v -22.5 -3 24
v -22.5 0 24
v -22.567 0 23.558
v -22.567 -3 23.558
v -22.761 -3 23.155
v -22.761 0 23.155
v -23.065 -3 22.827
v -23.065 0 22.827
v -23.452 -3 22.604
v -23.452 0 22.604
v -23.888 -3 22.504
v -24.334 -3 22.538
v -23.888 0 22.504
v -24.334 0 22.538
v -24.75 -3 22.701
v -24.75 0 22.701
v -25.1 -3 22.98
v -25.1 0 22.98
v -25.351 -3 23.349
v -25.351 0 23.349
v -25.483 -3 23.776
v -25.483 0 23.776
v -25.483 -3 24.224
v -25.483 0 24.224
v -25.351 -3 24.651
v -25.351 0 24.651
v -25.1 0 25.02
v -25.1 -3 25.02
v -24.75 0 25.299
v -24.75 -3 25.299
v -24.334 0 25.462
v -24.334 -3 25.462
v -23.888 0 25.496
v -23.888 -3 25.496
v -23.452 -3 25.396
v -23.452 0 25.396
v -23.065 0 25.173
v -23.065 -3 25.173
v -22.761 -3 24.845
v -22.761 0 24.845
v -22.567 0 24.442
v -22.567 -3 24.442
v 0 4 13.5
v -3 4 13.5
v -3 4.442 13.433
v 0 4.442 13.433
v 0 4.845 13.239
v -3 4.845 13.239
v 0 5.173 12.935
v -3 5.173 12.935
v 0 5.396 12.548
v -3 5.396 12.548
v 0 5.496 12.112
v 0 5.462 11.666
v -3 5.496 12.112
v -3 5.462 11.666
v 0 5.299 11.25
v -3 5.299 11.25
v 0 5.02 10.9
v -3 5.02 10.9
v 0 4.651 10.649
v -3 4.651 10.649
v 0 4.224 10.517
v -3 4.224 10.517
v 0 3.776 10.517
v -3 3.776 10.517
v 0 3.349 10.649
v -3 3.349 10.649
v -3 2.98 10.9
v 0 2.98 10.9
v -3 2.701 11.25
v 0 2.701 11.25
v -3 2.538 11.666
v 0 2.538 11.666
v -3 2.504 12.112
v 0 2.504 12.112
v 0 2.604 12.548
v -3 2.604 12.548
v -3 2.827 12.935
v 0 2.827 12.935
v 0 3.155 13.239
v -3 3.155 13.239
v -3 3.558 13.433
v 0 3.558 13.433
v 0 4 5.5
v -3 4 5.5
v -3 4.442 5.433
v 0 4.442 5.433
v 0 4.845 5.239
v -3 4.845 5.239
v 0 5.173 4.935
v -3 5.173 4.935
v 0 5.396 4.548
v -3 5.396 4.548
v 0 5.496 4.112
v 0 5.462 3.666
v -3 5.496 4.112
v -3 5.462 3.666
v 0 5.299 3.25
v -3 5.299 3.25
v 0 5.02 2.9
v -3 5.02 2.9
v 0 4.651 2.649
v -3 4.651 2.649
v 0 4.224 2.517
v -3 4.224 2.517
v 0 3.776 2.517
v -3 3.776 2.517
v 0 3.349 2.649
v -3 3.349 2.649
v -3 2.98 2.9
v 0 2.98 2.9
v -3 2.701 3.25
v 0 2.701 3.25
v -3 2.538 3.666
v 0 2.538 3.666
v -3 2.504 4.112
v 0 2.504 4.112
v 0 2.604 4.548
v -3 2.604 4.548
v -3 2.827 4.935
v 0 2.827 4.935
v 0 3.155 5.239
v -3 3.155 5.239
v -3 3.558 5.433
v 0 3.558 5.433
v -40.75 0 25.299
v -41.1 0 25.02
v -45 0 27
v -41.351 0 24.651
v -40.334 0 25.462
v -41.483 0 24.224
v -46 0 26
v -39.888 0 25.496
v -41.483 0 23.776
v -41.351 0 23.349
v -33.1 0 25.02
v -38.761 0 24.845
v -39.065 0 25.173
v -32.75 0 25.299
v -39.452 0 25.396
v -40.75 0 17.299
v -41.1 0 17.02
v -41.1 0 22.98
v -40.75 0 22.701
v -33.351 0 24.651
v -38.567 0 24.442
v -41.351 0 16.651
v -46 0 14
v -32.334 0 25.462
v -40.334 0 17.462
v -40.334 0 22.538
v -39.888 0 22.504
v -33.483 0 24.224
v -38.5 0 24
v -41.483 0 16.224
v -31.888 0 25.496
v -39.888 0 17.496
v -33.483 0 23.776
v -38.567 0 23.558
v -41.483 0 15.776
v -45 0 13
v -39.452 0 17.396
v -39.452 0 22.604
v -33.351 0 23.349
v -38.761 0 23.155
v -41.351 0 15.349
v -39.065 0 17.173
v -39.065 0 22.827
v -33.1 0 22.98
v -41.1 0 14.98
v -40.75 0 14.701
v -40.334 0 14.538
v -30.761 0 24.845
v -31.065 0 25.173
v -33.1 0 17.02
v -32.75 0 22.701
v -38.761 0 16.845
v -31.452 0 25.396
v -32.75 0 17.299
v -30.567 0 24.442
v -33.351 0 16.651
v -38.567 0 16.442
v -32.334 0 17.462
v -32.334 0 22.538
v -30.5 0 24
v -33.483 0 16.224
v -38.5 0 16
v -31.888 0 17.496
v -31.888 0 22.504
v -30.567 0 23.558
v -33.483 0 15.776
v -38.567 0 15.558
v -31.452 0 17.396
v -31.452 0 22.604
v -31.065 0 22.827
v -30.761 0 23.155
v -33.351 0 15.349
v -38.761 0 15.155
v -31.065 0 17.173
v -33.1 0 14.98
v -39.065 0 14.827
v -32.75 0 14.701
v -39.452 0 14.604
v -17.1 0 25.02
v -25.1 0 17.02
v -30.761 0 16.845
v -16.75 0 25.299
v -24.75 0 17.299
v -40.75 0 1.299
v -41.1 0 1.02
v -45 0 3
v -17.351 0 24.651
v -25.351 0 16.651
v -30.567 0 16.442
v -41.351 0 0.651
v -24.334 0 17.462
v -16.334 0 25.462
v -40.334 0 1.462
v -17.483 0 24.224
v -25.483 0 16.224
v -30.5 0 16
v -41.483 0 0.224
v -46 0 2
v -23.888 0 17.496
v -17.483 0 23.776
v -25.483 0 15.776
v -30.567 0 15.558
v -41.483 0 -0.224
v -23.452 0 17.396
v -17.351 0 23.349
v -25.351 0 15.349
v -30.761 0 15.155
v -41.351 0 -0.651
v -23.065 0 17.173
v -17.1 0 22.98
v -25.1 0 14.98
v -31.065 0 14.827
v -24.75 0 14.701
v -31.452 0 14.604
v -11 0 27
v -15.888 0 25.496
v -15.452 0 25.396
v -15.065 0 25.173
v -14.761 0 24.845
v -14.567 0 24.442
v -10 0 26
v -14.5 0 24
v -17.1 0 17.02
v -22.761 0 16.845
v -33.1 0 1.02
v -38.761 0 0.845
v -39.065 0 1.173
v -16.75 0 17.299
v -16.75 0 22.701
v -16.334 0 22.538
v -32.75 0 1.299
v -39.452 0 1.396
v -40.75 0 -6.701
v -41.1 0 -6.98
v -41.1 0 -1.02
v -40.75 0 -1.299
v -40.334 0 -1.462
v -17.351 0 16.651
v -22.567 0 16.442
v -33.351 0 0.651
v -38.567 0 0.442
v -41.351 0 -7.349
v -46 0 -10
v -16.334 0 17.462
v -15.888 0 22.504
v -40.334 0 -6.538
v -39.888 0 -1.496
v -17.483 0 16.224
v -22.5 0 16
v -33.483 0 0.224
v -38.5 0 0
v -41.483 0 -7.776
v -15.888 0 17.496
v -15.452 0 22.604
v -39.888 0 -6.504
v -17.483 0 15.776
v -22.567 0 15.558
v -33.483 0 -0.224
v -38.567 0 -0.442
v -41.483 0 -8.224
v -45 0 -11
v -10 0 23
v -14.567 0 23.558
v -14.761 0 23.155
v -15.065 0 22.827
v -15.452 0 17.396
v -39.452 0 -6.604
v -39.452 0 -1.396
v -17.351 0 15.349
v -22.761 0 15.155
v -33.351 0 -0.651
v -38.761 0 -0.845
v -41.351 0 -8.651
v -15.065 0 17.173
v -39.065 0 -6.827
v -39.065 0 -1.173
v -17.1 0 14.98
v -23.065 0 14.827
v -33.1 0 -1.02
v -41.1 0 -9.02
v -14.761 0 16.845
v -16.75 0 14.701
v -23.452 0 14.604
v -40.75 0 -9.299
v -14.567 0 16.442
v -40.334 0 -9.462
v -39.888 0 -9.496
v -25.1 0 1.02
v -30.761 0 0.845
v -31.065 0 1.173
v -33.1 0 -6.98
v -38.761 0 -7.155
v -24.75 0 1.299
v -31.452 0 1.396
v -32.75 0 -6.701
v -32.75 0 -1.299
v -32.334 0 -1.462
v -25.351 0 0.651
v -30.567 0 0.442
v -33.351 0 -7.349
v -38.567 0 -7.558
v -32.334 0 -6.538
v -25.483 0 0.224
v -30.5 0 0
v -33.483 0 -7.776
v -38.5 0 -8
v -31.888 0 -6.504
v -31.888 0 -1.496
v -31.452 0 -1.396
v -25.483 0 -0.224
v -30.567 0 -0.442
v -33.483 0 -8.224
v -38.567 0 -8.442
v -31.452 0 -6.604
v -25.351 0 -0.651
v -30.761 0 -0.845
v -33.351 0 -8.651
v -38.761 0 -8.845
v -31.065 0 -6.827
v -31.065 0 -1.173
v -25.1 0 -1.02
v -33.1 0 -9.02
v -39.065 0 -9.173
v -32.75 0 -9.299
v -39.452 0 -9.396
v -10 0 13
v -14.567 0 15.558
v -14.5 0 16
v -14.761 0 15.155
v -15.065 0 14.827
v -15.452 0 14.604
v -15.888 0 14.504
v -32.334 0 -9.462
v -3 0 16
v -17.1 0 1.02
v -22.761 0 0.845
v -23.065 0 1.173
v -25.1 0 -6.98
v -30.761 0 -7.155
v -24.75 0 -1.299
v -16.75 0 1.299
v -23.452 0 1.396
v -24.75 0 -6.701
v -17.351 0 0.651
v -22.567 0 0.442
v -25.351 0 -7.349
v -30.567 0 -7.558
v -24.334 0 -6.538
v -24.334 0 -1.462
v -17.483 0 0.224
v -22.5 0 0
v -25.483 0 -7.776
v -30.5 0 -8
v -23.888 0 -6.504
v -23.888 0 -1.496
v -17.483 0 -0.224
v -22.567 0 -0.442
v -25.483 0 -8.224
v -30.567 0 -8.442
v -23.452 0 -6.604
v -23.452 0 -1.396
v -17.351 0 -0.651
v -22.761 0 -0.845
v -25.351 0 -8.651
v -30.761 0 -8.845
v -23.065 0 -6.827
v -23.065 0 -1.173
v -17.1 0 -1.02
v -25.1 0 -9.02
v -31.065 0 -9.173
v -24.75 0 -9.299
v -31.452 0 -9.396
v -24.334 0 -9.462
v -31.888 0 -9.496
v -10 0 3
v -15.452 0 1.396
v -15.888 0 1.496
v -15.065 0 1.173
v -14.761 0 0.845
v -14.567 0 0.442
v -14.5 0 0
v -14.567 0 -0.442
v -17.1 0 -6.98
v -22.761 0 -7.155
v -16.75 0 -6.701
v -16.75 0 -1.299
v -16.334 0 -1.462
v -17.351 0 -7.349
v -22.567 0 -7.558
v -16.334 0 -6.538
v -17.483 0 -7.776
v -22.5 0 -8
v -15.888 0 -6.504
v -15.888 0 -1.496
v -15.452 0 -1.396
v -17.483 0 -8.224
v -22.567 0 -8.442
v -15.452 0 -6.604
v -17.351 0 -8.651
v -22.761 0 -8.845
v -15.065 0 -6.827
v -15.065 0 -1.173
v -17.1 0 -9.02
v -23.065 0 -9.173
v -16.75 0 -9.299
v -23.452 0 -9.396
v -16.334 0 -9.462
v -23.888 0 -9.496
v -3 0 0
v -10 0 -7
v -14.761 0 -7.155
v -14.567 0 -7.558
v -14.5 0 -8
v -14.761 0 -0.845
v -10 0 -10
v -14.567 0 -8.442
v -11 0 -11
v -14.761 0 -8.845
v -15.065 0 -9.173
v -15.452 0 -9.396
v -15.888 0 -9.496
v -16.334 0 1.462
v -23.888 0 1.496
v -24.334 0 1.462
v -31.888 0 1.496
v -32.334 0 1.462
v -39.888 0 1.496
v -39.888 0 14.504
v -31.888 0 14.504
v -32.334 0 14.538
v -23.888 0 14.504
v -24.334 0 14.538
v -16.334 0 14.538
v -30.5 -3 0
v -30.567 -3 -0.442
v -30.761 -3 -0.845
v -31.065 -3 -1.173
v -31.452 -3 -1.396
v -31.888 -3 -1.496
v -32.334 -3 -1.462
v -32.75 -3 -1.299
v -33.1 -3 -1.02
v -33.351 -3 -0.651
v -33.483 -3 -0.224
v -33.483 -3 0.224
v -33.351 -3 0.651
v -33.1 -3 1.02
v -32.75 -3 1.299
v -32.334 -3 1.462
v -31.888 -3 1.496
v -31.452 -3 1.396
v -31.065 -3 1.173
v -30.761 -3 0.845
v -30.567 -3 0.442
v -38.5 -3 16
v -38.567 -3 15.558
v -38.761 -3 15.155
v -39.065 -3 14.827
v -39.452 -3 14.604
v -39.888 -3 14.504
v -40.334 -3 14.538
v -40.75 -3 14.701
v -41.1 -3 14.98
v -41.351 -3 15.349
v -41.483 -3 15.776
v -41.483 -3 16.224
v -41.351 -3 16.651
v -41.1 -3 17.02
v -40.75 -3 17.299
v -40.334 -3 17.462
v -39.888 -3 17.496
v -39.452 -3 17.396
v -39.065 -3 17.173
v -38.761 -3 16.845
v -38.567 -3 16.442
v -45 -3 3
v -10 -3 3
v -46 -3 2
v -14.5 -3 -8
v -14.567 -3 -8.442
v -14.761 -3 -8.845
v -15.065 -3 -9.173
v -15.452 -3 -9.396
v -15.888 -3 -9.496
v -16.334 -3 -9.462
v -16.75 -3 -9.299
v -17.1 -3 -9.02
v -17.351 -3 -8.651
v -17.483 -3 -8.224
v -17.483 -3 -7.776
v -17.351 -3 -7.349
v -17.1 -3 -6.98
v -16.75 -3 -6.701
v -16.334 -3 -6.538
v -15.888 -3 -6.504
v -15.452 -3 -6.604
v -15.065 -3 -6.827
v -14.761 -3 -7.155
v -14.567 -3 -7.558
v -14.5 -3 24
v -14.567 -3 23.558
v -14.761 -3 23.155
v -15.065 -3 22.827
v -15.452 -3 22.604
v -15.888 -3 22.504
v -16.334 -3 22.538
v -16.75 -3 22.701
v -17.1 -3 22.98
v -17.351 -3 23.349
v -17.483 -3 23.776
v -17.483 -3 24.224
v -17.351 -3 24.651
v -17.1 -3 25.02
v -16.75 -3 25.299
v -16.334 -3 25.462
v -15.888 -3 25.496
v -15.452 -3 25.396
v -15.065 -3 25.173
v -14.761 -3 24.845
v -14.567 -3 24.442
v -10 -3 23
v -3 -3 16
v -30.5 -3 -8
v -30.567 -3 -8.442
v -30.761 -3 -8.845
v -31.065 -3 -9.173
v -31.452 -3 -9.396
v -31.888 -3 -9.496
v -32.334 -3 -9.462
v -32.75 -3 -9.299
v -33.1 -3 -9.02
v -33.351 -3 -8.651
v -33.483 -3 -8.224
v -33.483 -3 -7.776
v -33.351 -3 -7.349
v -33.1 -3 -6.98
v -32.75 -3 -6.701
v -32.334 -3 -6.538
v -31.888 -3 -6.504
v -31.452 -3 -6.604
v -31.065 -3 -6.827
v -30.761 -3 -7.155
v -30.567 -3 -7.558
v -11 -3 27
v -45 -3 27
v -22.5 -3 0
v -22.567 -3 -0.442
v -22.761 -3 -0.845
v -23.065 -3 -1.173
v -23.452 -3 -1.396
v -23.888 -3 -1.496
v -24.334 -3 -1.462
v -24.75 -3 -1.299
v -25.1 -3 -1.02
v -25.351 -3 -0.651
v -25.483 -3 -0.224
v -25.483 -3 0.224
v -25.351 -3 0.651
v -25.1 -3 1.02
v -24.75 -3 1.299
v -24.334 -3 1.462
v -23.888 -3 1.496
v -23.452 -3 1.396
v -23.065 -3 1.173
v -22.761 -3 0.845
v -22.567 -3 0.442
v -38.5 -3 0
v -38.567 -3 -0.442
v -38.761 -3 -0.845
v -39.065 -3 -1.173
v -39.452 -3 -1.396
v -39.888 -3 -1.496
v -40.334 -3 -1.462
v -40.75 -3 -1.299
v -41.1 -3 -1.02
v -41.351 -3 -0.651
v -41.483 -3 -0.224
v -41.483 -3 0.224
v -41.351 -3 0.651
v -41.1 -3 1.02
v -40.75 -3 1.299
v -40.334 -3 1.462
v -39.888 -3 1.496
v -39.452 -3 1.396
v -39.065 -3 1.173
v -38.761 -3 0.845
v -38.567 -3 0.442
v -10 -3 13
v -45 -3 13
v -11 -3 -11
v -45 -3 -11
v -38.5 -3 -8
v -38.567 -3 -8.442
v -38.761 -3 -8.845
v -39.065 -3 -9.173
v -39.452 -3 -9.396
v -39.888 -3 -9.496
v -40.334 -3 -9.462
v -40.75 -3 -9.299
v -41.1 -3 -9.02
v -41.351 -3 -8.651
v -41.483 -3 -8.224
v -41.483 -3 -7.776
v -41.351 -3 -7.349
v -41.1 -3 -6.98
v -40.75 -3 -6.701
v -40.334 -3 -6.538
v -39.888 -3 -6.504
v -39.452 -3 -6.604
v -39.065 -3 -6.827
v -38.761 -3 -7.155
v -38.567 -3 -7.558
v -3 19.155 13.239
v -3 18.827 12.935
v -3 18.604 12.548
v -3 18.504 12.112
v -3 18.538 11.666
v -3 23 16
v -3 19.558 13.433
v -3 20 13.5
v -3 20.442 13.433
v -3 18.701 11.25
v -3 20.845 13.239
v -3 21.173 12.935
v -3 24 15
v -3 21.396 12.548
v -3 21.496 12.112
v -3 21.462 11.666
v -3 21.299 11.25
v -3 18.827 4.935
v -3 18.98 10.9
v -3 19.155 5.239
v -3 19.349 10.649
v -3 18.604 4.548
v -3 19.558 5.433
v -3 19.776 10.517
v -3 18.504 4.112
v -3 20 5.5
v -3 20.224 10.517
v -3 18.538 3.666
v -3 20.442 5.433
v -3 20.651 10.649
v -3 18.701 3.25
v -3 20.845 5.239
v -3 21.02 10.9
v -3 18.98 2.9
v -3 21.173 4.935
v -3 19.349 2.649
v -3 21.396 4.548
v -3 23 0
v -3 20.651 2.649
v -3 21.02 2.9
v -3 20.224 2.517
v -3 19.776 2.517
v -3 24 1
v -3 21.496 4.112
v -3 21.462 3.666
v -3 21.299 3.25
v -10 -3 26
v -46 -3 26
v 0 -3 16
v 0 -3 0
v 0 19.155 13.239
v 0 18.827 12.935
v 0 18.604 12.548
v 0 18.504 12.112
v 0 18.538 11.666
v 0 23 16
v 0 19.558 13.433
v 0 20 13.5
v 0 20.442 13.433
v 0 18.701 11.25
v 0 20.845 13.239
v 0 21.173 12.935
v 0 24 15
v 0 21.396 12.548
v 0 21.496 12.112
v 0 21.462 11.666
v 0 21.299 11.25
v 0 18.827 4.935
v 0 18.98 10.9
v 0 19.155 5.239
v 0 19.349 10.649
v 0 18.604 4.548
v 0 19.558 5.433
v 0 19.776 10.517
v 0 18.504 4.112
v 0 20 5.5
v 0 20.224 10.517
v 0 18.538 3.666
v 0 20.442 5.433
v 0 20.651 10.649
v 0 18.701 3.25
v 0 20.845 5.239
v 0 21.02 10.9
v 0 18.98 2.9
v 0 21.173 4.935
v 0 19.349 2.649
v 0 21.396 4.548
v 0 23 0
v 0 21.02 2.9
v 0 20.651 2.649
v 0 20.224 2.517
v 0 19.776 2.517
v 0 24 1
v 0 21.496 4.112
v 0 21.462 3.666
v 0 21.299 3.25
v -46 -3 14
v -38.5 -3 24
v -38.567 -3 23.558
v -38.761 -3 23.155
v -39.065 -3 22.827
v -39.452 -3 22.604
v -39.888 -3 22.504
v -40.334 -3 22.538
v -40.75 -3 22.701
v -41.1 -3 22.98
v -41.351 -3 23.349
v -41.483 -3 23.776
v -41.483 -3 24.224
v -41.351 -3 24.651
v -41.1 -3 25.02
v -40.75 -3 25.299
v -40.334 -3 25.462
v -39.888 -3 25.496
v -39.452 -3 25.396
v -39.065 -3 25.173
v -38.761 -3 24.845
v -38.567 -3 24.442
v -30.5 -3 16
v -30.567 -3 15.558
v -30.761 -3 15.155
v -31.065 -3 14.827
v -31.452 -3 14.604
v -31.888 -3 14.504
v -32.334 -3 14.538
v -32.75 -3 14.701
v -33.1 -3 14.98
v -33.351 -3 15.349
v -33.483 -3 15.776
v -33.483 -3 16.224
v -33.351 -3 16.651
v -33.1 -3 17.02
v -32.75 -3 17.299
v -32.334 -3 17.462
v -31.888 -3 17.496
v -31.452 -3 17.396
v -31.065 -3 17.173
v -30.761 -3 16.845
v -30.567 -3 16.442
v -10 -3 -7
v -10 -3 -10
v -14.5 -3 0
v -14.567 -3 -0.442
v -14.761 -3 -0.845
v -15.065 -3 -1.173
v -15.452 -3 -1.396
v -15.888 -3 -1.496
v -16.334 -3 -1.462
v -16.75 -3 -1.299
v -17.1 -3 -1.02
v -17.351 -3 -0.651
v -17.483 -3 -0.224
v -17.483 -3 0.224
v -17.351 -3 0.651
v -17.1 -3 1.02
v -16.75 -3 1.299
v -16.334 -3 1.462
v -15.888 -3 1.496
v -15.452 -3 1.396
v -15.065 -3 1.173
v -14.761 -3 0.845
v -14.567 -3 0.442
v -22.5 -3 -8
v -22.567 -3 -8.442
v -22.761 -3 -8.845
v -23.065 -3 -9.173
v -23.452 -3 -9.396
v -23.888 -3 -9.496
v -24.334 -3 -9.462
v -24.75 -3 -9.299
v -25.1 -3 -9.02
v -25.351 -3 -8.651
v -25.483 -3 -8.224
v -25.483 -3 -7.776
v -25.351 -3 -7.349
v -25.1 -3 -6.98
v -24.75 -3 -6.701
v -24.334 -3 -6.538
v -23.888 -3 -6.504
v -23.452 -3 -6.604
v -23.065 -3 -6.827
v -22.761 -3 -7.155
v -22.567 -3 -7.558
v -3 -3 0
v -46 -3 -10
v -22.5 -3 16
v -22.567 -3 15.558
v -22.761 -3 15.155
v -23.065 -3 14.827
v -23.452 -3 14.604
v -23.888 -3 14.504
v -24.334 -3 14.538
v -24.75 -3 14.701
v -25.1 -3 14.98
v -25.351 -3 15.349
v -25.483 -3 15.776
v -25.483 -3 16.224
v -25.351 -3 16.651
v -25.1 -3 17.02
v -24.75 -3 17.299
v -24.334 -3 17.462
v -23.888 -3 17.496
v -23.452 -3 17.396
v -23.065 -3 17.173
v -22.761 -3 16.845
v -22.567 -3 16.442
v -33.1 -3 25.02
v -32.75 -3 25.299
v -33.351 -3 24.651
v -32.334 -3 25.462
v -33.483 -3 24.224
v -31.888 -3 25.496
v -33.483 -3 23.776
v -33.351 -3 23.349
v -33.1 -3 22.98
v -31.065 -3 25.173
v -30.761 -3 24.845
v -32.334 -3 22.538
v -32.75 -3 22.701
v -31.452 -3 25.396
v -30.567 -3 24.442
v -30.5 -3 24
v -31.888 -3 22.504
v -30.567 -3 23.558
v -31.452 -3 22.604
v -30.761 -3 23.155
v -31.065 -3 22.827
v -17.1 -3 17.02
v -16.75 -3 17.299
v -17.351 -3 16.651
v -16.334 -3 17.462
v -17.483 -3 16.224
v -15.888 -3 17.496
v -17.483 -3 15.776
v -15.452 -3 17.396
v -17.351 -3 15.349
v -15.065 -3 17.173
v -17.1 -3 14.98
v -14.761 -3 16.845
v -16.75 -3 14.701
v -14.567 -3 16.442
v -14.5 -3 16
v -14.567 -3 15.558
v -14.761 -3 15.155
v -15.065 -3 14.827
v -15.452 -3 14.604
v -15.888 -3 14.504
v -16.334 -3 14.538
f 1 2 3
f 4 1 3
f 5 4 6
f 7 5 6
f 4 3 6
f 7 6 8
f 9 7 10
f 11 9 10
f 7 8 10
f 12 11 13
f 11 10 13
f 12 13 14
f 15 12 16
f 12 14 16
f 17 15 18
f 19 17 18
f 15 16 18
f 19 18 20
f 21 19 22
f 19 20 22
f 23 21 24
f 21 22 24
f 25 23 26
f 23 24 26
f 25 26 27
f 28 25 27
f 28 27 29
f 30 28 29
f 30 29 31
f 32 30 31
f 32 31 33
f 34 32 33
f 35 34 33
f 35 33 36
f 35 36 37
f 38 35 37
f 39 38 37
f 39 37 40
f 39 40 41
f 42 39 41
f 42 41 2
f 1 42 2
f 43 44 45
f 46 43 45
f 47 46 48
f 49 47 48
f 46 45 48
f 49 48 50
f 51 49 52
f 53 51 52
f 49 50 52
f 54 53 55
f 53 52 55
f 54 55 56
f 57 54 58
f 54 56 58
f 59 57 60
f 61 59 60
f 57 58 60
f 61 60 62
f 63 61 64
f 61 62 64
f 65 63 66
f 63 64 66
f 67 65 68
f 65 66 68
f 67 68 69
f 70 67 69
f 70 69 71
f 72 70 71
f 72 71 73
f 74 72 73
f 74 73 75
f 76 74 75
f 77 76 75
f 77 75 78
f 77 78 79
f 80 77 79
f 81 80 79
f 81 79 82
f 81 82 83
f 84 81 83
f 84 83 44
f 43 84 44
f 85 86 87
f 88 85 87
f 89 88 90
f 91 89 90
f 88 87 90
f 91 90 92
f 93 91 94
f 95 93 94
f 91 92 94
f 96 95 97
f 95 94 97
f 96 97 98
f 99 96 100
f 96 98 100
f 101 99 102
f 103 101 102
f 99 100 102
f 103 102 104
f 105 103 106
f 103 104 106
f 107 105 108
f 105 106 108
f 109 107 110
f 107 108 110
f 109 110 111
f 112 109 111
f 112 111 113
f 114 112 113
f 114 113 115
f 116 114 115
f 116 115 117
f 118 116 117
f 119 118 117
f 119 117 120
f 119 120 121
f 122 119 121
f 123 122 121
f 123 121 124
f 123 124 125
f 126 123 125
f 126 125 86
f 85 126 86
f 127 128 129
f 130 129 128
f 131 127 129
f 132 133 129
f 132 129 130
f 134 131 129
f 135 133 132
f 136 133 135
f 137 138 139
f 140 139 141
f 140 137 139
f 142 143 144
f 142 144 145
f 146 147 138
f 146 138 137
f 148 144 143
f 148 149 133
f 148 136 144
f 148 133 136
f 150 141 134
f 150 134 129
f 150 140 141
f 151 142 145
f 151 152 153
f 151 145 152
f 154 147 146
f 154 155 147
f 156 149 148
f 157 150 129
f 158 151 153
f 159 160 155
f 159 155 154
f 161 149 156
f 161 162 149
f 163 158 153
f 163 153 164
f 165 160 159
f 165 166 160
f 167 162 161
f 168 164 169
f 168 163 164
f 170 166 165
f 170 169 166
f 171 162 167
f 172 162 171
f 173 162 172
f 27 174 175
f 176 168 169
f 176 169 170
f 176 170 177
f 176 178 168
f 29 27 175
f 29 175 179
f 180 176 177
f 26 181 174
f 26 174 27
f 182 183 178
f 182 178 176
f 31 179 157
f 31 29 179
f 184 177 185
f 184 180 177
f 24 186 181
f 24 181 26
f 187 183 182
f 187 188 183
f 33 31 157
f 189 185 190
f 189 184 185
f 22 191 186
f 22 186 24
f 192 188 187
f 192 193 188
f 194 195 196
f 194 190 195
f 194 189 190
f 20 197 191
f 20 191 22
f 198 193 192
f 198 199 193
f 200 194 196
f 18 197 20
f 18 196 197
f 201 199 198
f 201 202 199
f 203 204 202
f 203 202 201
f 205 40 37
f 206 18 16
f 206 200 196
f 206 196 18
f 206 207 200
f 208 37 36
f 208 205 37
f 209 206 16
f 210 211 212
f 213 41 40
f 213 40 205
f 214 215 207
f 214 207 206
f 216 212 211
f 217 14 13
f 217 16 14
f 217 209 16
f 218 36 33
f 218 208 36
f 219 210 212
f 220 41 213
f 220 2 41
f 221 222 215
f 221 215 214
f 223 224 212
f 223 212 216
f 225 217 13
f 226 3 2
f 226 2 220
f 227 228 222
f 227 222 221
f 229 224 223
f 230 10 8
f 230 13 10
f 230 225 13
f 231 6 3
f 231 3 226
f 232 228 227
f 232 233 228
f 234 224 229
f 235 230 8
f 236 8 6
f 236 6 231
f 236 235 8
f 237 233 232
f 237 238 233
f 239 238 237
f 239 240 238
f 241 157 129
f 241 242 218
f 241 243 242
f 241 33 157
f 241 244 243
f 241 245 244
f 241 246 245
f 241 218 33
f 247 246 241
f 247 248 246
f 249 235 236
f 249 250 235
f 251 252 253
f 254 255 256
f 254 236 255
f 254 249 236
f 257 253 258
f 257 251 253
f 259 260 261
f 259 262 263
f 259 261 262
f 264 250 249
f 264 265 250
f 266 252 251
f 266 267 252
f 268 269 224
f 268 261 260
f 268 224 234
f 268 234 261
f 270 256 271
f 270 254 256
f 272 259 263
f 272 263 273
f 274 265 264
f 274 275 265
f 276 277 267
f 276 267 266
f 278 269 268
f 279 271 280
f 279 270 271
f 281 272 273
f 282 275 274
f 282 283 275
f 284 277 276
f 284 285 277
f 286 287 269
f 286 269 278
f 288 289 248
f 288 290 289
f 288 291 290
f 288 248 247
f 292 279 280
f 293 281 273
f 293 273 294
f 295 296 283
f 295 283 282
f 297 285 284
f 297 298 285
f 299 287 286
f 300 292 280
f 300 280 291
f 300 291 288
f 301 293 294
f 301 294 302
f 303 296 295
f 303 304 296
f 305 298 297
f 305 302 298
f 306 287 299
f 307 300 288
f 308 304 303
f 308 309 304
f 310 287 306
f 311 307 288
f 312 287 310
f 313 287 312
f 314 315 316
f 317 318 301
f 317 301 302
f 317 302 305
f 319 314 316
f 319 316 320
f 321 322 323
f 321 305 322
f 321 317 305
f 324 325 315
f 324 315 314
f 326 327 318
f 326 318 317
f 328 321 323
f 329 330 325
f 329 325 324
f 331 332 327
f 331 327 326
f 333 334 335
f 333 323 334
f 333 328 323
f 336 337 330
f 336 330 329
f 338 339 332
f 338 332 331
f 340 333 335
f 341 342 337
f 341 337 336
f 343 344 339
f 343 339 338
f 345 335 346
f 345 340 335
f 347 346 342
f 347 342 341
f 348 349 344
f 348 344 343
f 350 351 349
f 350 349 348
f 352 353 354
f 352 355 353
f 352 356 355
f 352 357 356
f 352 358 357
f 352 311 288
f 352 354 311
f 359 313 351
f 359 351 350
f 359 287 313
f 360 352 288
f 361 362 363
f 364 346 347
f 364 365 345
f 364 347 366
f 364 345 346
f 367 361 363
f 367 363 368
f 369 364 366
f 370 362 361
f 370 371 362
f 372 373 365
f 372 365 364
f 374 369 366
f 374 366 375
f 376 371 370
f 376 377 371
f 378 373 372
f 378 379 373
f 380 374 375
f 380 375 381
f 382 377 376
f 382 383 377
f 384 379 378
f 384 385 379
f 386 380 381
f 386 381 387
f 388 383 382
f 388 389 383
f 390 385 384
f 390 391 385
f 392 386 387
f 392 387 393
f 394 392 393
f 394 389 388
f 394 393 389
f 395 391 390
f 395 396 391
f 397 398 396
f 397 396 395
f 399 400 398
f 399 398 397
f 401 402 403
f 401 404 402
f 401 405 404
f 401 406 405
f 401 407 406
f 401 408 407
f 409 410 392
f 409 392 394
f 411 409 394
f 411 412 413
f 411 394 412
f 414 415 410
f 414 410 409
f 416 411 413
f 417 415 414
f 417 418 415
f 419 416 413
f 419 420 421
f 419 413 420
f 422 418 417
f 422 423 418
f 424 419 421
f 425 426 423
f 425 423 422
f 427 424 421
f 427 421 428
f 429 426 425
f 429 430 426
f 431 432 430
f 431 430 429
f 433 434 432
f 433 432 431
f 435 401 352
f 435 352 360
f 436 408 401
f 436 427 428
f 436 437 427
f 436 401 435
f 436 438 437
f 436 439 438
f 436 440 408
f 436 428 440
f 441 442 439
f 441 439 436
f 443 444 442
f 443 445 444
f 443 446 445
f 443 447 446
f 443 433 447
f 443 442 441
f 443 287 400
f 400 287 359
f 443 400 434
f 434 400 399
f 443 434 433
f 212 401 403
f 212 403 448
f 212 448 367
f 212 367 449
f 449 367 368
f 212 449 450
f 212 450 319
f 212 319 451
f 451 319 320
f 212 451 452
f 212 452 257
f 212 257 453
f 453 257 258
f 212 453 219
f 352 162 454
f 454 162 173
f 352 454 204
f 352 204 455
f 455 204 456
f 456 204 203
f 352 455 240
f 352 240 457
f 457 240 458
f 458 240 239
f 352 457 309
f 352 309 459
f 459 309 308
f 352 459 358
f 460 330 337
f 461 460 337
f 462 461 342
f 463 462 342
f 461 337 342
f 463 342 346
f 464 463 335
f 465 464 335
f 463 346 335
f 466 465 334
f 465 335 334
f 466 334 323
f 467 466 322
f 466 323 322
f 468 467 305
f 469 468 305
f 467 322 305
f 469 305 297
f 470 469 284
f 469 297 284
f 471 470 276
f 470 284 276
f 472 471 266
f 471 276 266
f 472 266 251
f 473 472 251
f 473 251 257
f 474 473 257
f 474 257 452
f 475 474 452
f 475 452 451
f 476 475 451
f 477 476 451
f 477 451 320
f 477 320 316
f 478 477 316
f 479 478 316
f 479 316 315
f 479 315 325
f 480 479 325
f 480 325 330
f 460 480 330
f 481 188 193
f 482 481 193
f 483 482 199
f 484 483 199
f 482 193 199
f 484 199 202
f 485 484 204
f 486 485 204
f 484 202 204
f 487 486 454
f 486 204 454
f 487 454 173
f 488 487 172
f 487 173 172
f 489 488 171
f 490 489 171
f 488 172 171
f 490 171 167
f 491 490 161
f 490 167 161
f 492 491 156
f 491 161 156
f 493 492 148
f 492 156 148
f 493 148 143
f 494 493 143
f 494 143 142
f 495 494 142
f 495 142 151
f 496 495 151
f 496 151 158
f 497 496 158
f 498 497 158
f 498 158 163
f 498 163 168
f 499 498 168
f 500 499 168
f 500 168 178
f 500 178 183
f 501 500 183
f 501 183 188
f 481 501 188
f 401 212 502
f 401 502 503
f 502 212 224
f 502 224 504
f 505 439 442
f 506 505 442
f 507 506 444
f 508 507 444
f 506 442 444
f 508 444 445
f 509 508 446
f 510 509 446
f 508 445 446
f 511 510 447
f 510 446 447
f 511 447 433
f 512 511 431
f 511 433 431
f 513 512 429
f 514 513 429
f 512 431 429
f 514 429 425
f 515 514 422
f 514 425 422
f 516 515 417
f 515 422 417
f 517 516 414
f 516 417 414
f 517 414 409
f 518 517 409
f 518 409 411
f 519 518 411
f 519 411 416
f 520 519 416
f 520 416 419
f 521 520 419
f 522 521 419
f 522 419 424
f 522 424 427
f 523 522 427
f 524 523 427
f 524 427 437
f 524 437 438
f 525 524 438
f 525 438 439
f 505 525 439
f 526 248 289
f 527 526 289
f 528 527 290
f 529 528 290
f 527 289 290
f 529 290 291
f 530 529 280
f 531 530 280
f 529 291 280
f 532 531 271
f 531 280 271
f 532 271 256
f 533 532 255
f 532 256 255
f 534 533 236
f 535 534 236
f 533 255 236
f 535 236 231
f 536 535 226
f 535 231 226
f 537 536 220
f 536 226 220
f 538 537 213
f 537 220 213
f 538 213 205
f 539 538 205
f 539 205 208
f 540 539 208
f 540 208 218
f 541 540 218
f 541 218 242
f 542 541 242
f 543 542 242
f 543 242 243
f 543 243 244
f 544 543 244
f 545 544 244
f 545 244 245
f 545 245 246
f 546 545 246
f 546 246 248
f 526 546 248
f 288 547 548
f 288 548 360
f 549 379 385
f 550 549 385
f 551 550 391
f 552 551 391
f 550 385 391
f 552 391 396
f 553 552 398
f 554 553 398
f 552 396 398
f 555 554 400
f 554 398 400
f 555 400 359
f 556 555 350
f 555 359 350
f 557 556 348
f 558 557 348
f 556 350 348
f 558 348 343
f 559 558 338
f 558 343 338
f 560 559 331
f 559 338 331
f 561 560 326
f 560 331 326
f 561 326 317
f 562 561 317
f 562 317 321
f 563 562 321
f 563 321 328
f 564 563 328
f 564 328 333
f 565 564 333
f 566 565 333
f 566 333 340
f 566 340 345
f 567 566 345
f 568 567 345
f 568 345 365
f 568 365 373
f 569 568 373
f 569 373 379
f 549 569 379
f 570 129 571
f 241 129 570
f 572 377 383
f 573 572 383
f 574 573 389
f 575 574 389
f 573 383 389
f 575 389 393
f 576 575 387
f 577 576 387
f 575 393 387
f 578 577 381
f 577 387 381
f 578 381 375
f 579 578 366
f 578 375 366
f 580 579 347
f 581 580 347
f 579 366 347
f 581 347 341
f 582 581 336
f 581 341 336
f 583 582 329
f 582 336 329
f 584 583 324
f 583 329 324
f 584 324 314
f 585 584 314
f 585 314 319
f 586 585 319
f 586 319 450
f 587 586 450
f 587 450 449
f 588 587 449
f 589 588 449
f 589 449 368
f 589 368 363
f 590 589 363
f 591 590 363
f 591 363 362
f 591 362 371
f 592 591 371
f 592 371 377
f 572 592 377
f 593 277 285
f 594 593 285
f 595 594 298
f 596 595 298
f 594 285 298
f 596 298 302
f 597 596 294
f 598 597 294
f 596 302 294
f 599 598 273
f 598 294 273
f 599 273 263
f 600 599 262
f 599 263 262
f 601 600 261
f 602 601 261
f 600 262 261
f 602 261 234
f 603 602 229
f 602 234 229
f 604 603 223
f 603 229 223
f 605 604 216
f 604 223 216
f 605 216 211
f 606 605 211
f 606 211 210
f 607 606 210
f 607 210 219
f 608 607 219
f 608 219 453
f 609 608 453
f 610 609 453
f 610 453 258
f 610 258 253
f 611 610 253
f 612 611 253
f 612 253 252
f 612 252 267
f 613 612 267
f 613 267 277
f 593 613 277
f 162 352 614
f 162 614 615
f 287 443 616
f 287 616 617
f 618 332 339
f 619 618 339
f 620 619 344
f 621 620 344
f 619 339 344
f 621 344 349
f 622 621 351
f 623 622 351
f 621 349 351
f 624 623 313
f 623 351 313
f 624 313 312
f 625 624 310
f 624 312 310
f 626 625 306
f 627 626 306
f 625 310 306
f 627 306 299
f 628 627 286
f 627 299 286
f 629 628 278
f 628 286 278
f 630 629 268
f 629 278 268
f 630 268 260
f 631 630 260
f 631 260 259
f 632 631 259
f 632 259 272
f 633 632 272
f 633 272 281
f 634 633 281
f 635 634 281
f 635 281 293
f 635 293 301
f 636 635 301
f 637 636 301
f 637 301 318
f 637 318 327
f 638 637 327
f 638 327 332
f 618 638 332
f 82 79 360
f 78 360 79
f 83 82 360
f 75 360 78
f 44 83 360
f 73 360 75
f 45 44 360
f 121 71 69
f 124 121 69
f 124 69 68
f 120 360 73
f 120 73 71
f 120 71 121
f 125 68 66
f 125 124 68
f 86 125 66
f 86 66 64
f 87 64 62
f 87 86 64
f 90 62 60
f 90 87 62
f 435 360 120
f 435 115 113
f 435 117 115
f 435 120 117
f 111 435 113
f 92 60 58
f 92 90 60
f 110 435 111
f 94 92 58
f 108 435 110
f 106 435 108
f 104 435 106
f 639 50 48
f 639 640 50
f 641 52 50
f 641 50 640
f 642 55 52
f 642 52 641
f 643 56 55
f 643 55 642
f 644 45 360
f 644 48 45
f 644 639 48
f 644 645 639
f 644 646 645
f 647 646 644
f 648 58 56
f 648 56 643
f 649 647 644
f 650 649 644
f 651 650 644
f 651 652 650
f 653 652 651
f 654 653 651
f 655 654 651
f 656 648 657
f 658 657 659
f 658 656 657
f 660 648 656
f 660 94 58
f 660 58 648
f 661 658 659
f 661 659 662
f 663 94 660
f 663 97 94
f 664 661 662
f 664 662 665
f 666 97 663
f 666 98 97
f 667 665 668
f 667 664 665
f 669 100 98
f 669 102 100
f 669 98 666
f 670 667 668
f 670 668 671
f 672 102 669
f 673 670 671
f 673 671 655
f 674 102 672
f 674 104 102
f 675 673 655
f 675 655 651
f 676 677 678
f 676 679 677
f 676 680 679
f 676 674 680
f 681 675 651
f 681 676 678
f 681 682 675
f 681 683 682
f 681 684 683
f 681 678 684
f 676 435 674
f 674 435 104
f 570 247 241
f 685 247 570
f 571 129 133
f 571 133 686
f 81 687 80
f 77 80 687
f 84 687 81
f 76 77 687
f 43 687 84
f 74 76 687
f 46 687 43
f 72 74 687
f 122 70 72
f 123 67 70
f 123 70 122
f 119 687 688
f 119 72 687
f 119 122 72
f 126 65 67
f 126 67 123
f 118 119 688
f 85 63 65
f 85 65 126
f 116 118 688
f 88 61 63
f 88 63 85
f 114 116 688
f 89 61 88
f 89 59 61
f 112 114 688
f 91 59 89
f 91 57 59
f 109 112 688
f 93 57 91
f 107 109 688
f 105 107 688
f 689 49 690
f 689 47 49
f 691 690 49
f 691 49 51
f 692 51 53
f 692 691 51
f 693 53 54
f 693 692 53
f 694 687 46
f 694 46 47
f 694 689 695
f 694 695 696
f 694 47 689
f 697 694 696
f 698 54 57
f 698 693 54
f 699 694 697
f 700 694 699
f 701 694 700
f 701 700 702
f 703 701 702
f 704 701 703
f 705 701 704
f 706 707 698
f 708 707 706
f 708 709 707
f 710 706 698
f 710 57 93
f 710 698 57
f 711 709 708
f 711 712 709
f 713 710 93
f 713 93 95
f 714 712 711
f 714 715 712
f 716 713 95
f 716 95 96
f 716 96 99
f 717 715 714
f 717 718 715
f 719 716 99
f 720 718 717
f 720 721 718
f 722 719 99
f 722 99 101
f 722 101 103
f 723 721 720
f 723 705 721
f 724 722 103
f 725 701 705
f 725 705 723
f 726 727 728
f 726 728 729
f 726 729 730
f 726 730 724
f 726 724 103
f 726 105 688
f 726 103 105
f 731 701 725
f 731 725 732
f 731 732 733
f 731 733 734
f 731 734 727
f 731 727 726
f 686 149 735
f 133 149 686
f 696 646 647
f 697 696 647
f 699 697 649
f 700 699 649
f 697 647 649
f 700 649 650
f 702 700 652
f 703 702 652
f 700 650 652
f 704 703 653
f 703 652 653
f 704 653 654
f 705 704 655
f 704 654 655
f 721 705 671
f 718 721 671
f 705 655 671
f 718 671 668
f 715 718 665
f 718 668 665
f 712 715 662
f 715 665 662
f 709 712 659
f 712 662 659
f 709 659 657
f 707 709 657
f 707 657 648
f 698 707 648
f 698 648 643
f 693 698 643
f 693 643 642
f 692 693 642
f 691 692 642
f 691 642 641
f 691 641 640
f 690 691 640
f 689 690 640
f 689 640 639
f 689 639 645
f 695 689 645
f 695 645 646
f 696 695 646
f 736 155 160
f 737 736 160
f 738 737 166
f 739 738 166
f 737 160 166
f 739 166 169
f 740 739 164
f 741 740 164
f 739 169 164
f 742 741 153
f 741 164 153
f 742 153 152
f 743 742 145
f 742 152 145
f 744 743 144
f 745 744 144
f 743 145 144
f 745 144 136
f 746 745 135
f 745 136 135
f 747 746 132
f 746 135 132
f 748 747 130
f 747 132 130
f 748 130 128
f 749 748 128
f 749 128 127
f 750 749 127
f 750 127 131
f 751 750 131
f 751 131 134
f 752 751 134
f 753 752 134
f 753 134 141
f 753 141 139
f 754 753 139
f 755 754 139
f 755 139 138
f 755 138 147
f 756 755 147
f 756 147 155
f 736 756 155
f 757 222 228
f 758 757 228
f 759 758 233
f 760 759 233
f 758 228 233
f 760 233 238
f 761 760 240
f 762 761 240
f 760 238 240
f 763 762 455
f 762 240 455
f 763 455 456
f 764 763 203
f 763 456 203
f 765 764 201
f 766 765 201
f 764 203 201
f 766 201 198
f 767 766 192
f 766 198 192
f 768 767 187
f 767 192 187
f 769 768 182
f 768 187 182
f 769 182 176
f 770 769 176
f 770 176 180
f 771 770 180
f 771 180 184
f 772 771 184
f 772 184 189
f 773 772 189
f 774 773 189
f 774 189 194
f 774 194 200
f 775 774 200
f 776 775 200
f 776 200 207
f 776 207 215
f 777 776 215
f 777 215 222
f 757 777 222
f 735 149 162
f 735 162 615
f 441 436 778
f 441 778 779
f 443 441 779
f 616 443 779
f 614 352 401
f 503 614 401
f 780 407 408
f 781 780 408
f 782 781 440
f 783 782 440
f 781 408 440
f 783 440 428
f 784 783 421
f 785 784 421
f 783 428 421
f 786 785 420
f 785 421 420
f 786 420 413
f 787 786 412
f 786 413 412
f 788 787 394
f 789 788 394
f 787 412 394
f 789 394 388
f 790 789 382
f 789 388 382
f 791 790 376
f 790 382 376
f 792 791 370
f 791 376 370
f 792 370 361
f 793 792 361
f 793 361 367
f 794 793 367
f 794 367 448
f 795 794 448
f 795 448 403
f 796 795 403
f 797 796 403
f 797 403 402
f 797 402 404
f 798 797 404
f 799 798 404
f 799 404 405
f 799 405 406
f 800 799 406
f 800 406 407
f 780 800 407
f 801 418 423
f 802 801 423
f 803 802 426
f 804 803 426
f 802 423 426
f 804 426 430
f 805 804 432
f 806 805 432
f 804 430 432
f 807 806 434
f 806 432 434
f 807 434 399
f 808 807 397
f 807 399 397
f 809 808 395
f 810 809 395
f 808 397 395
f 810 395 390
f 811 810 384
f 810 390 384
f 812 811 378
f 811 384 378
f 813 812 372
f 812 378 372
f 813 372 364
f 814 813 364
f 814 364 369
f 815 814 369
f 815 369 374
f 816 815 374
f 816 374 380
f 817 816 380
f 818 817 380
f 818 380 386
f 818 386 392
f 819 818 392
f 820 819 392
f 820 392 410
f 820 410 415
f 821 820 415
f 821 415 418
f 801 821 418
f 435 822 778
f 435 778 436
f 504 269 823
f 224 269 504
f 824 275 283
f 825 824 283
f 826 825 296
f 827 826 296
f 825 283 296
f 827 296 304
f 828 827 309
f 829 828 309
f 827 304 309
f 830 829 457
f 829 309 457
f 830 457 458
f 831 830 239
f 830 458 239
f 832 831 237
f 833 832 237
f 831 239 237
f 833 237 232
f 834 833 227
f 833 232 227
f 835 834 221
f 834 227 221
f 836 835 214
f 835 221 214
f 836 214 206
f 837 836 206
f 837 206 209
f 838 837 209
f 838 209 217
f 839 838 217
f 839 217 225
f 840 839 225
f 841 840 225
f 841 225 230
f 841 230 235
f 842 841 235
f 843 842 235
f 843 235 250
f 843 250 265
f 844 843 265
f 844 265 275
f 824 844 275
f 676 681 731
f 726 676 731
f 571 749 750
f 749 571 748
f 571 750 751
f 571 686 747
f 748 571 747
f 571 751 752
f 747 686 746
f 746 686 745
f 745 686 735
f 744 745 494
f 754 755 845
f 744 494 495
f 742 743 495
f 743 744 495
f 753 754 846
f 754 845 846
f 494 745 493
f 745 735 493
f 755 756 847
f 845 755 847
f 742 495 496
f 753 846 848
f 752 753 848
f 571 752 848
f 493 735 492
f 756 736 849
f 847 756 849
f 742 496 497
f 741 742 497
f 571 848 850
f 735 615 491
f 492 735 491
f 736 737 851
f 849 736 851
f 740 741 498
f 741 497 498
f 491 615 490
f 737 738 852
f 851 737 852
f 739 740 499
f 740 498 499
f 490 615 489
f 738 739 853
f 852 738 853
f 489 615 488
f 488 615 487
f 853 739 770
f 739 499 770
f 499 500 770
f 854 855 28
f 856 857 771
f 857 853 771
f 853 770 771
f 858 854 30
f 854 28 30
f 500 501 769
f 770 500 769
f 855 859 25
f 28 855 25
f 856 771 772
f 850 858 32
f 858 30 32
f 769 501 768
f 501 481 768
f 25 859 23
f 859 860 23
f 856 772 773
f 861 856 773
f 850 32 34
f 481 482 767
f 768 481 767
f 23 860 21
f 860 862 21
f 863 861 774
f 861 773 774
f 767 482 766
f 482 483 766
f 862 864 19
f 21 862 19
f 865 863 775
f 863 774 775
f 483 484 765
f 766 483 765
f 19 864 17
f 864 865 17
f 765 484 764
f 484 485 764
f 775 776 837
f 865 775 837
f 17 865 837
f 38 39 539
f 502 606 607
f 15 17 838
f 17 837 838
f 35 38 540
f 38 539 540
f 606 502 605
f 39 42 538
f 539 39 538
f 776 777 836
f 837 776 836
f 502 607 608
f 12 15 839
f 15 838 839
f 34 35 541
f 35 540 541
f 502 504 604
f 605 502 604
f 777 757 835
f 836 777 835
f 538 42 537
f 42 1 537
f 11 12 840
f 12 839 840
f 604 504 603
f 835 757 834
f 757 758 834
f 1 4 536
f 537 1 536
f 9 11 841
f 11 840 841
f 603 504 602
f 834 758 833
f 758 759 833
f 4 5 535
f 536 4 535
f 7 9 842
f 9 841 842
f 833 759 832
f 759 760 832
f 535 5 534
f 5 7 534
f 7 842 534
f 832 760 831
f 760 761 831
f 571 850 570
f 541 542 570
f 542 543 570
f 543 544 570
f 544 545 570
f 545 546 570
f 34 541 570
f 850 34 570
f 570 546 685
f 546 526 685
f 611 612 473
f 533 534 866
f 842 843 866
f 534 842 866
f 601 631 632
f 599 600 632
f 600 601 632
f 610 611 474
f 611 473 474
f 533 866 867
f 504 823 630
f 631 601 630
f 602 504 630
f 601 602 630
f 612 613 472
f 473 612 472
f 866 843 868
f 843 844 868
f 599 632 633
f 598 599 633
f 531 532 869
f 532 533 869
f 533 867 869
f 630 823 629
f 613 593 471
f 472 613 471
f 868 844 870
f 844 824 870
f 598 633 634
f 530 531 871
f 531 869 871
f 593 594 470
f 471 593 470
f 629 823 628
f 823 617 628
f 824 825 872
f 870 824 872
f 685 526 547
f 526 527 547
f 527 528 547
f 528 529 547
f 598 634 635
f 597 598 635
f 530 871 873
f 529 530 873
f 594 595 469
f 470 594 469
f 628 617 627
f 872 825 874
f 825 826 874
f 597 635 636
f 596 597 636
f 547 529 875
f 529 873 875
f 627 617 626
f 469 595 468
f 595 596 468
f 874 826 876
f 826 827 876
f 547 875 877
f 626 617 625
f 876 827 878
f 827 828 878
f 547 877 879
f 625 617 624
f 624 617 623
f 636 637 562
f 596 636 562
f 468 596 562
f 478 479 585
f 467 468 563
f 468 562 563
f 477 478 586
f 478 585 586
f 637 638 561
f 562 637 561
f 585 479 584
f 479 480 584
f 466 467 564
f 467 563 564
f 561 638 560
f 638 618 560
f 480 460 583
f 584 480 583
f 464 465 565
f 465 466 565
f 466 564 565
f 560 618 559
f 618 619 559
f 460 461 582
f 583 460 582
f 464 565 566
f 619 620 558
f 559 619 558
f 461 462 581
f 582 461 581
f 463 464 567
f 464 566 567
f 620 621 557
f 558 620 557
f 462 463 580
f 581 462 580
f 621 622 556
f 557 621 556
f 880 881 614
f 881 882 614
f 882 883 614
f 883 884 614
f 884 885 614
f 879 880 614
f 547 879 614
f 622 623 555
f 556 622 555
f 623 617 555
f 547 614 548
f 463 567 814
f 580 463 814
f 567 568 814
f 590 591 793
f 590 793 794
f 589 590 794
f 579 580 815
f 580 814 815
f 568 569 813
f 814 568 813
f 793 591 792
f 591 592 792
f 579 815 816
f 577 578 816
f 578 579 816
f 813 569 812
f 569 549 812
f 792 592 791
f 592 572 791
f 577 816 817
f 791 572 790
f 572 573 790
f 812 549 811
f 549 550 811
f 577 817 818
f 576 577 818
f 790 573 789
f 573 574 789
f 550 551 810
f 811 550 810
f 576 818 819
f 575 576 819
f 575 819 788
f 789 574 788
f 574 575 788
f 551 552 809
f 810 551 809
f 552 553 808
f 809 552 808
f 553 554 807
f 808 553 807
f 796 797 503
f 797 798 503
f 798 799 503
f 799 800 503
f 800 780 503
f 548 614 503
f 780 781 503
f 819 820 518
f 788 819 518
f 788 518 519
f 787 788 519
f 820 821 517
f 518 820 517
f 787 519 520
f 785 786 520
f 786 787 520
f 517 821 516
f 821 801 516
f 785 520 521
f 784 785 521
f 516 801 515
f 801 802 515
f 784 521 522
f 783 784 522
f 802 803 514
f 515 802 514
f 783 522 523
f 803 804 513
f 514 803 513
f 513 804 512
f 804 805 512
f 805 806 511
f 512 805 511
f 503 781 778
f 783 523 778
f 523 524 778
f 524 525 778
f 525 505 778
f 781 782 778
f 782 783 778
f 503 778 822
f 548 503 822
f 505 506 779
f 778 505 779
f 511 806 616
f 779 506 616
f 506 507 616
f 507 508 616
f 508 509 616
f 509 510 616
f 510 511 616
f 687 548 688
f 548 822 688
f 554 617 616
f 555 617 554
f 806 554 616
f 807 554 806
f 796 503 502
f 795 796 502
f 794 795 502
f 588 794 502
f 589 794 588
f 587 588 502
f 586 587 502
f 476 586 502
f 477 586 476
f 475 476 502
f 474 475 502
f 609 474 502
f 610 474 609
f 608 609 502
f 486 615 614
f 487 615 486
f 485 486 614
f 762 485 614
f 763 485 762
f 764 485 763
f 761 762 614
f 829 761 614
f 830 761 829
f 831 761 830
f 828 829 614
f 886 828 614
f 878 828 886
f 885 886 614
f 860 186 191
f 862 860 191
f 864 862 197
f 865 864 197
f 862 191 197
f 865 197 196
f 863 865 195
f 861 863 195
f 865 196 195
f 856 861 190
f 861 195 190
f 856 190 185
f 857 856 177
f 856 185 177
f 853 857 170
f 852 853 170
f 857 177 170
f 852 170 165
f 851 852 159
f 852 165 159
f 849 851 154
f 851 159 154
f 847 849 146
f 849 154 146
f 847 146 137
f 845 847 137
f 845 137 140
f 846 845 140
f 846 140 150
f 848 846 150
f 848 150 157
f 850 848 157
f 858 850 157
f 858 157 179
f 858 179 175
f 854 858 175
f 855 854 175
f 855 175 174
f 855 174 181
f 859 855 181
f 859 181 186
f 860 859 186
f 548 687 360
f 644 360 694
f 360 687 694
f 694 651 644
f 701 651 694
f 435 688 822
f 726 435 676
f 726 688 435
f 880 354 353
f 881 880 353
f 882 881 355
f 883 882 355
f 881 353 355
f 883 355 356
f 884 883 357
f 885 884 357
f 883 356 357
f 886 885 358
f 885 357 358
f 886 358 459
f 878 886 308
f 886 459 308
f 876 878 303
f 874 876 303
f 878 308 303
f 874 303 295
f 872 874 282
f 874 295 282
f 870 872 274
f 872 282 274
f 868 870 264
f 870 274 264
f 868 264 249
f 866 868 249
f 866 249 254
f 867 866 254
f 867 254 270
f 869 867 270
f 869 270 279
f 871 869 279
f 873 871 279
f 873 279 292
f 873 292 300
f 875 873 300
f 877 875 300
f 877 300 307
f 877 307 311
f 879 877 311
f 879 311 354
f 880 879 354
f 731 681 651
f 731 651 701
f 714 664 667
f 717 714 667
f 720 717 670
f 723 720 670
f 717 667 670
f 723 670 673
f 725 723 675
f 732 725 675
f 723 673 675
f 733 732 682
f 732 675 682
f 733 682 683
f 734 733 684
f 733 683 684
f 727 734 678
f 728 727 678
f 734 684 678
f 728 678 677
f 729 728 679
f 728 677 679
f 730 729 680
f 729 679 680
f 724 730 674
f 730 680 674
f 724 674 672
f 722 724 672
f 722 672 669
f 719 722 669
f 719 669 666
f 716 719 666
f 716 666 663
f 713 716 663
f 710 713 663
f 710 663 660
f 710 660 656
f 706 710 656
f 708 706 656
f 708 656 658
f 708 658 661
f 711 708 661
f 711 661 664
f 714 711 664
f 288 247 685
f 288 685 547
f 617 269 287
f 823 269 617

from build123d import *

# Parameters (mm, degrees)
SKETCH_1_W          = 3
SKETCH_1_H          = 24
EXTRUDE_1_DEPTH     = 16
SKETCH_2_R          = 1.5
CUT_EXTRUDE_1_DEPTH = 16
CHAMFER_1_SIZE      = 1
SKETCH_3_W          = 16
SKETCH_3_H          = 3
EXTRUDE_2_DEPTH     = 10
EXTRUDE_3_DEPTH     = 3
CHAMFER_2_SIZE      = 1
SKETCH_5_R          = 1.5
CUT_EXTRUDE_2_DEPTH = 10
CHAMFER_3_SIZE      = 7


with BuildPart() as part:
    # 草图1 → 凸台-拉伸1 (new body)
    with BuildSketch(Plane.XY):
        with Locations((-1.5, 12)):
            Rectangle(SKETCH_1_W, SKETCH_1_H)
    extrude(amount=EXTRUDE_1_DEPTH)

    # 草图2 → 切除-拉伸1 (cut)
    with BuildSketch(Plane.ZY.offset(3)):
        with Locations((4, 4)):
            Circle(SKETCH_2_R)
        with Locations((12, 4)):
            Circle(SKETCH_2_R)
        with Locations((4, 20)):
            Circle(SKETCH_2_R)
        with Locations((12, 20)):
            Circle(SKETCH_2_R)
    extrude(amount=-CUT_EXTRUDE_1_DEPTH, mode=Mode.SUBTRACT)

    # 倒角1
    chamfer_1_edges = [part.edges().sort_by_distance(p)[0] for p in [
        (-1.5, 24, 0),
        (-1.5, 24, 16),
    ]]
    chamfer(chamfer_1_edges, length=CHAMFER_1_SIZE)

    # 草图3 → 凸台-拉伸2 (add)
    with BuildSketch(Plane(origin=(0, 0, 0), x_dir=(0, 0, -1), z_dir=(1, 0, 0))):
        with Locations((-8, -1.5)):
            Rectangle(SKETCH_3_W, SKETCH_3_H)
    extrude(amount=-EXTRUDE_2_DEPTH)

    # 草图4 → 凸台-拉伸3 (add)
    with BuildSketch(Plane(origin=(0, 0, 0), x_dir=(1, 0, 0), z_dir=(0, 1, 0))):
        Polygon((-10, 11), (-46, 11), (-46, -3), (-10, -3), (-10, 0), align=None)
        Polygon((-10, -16), (-10, -13), (-46, -13), (-46, -27), (-10, -27), align=None)
    extrude(amount=-EXTRUDE_3_DEPTH)

    # 倒角2
    chamfer_2_edges = [part.edges().sort_by_distance(p)[0] for p in [
        (-46, -1.5, 3),
        (-46, -1.5, -11),
        (-10, -1.5, -11),
        (-46, -1.5, 27),
        (-10, -1.5, 27),
        (-46, -1.5, 13),
    ]]
    chamfer(chamfer_2_edges, length=CHAMFER_2_SIZE)

    # 草图5 → 切除-拉伸2 (cut)
    with BuildSketch(Plane(origin=(0, 0, 0), x_dir=(1, 0, 0), z_dir=(0, 1, 0))):
        with Locations((-40, 8)):
            Circle(SKETCH_5_R)
        with Locations((-32, 8)):
            Circle(SKETCH_5_R)
        with Locations((-24, 8)):
            Circle(SKETCH_5_R)
        with Locations((-16, 8)):
            Circle(SKETCH_5_R)
        with Locations((-40, 0)):
            Circle(SKETCH_5_R)
        with Locations((-32, 0)):
            Circle(SKETCH_5_R)
        with Locations((-24, 0)):
            Circle(SKETCH_5_R)
        with Locations((-16, 0)):
            Circle(SKETCH_5_R)
        with Locations((-40, -16)):
            Circle(SKETCH_5_R)
        with Locations((-40, -24)):
            Circle(SKETCH_5_R)
        with Locations((-32, -16)):
            Circle(SKETCH_5_R)
        with Locations((-32, -24)):
            Circle(SKETCH_5_R)
        with Locations((-24, -16)):
            Circle(SKETCH_5_R)
        with Locations((-24, -24)):
            Circle(SKETCH_5_R)
        with Locations((-16, -16)):
            Circle(SKETCH_5_R)
        with Locations((-16, -24)):
            Circle(SKETCH_5_R)
    extrude(amount=-CUT_EXTRUDE_2_DEPTH, mode=Mode.SUBTRACT)

    # 倒角3
    chamfer_3_edges = [part.edges().sort_by_distance(p)[0] for p in [
        (-10, -1.5, 16),
        (-10, -1.5, 0),
    ]]
    chamfer(chamfer_3_edges, length=CHAMFER_3_SIZE)


solid = part.part
